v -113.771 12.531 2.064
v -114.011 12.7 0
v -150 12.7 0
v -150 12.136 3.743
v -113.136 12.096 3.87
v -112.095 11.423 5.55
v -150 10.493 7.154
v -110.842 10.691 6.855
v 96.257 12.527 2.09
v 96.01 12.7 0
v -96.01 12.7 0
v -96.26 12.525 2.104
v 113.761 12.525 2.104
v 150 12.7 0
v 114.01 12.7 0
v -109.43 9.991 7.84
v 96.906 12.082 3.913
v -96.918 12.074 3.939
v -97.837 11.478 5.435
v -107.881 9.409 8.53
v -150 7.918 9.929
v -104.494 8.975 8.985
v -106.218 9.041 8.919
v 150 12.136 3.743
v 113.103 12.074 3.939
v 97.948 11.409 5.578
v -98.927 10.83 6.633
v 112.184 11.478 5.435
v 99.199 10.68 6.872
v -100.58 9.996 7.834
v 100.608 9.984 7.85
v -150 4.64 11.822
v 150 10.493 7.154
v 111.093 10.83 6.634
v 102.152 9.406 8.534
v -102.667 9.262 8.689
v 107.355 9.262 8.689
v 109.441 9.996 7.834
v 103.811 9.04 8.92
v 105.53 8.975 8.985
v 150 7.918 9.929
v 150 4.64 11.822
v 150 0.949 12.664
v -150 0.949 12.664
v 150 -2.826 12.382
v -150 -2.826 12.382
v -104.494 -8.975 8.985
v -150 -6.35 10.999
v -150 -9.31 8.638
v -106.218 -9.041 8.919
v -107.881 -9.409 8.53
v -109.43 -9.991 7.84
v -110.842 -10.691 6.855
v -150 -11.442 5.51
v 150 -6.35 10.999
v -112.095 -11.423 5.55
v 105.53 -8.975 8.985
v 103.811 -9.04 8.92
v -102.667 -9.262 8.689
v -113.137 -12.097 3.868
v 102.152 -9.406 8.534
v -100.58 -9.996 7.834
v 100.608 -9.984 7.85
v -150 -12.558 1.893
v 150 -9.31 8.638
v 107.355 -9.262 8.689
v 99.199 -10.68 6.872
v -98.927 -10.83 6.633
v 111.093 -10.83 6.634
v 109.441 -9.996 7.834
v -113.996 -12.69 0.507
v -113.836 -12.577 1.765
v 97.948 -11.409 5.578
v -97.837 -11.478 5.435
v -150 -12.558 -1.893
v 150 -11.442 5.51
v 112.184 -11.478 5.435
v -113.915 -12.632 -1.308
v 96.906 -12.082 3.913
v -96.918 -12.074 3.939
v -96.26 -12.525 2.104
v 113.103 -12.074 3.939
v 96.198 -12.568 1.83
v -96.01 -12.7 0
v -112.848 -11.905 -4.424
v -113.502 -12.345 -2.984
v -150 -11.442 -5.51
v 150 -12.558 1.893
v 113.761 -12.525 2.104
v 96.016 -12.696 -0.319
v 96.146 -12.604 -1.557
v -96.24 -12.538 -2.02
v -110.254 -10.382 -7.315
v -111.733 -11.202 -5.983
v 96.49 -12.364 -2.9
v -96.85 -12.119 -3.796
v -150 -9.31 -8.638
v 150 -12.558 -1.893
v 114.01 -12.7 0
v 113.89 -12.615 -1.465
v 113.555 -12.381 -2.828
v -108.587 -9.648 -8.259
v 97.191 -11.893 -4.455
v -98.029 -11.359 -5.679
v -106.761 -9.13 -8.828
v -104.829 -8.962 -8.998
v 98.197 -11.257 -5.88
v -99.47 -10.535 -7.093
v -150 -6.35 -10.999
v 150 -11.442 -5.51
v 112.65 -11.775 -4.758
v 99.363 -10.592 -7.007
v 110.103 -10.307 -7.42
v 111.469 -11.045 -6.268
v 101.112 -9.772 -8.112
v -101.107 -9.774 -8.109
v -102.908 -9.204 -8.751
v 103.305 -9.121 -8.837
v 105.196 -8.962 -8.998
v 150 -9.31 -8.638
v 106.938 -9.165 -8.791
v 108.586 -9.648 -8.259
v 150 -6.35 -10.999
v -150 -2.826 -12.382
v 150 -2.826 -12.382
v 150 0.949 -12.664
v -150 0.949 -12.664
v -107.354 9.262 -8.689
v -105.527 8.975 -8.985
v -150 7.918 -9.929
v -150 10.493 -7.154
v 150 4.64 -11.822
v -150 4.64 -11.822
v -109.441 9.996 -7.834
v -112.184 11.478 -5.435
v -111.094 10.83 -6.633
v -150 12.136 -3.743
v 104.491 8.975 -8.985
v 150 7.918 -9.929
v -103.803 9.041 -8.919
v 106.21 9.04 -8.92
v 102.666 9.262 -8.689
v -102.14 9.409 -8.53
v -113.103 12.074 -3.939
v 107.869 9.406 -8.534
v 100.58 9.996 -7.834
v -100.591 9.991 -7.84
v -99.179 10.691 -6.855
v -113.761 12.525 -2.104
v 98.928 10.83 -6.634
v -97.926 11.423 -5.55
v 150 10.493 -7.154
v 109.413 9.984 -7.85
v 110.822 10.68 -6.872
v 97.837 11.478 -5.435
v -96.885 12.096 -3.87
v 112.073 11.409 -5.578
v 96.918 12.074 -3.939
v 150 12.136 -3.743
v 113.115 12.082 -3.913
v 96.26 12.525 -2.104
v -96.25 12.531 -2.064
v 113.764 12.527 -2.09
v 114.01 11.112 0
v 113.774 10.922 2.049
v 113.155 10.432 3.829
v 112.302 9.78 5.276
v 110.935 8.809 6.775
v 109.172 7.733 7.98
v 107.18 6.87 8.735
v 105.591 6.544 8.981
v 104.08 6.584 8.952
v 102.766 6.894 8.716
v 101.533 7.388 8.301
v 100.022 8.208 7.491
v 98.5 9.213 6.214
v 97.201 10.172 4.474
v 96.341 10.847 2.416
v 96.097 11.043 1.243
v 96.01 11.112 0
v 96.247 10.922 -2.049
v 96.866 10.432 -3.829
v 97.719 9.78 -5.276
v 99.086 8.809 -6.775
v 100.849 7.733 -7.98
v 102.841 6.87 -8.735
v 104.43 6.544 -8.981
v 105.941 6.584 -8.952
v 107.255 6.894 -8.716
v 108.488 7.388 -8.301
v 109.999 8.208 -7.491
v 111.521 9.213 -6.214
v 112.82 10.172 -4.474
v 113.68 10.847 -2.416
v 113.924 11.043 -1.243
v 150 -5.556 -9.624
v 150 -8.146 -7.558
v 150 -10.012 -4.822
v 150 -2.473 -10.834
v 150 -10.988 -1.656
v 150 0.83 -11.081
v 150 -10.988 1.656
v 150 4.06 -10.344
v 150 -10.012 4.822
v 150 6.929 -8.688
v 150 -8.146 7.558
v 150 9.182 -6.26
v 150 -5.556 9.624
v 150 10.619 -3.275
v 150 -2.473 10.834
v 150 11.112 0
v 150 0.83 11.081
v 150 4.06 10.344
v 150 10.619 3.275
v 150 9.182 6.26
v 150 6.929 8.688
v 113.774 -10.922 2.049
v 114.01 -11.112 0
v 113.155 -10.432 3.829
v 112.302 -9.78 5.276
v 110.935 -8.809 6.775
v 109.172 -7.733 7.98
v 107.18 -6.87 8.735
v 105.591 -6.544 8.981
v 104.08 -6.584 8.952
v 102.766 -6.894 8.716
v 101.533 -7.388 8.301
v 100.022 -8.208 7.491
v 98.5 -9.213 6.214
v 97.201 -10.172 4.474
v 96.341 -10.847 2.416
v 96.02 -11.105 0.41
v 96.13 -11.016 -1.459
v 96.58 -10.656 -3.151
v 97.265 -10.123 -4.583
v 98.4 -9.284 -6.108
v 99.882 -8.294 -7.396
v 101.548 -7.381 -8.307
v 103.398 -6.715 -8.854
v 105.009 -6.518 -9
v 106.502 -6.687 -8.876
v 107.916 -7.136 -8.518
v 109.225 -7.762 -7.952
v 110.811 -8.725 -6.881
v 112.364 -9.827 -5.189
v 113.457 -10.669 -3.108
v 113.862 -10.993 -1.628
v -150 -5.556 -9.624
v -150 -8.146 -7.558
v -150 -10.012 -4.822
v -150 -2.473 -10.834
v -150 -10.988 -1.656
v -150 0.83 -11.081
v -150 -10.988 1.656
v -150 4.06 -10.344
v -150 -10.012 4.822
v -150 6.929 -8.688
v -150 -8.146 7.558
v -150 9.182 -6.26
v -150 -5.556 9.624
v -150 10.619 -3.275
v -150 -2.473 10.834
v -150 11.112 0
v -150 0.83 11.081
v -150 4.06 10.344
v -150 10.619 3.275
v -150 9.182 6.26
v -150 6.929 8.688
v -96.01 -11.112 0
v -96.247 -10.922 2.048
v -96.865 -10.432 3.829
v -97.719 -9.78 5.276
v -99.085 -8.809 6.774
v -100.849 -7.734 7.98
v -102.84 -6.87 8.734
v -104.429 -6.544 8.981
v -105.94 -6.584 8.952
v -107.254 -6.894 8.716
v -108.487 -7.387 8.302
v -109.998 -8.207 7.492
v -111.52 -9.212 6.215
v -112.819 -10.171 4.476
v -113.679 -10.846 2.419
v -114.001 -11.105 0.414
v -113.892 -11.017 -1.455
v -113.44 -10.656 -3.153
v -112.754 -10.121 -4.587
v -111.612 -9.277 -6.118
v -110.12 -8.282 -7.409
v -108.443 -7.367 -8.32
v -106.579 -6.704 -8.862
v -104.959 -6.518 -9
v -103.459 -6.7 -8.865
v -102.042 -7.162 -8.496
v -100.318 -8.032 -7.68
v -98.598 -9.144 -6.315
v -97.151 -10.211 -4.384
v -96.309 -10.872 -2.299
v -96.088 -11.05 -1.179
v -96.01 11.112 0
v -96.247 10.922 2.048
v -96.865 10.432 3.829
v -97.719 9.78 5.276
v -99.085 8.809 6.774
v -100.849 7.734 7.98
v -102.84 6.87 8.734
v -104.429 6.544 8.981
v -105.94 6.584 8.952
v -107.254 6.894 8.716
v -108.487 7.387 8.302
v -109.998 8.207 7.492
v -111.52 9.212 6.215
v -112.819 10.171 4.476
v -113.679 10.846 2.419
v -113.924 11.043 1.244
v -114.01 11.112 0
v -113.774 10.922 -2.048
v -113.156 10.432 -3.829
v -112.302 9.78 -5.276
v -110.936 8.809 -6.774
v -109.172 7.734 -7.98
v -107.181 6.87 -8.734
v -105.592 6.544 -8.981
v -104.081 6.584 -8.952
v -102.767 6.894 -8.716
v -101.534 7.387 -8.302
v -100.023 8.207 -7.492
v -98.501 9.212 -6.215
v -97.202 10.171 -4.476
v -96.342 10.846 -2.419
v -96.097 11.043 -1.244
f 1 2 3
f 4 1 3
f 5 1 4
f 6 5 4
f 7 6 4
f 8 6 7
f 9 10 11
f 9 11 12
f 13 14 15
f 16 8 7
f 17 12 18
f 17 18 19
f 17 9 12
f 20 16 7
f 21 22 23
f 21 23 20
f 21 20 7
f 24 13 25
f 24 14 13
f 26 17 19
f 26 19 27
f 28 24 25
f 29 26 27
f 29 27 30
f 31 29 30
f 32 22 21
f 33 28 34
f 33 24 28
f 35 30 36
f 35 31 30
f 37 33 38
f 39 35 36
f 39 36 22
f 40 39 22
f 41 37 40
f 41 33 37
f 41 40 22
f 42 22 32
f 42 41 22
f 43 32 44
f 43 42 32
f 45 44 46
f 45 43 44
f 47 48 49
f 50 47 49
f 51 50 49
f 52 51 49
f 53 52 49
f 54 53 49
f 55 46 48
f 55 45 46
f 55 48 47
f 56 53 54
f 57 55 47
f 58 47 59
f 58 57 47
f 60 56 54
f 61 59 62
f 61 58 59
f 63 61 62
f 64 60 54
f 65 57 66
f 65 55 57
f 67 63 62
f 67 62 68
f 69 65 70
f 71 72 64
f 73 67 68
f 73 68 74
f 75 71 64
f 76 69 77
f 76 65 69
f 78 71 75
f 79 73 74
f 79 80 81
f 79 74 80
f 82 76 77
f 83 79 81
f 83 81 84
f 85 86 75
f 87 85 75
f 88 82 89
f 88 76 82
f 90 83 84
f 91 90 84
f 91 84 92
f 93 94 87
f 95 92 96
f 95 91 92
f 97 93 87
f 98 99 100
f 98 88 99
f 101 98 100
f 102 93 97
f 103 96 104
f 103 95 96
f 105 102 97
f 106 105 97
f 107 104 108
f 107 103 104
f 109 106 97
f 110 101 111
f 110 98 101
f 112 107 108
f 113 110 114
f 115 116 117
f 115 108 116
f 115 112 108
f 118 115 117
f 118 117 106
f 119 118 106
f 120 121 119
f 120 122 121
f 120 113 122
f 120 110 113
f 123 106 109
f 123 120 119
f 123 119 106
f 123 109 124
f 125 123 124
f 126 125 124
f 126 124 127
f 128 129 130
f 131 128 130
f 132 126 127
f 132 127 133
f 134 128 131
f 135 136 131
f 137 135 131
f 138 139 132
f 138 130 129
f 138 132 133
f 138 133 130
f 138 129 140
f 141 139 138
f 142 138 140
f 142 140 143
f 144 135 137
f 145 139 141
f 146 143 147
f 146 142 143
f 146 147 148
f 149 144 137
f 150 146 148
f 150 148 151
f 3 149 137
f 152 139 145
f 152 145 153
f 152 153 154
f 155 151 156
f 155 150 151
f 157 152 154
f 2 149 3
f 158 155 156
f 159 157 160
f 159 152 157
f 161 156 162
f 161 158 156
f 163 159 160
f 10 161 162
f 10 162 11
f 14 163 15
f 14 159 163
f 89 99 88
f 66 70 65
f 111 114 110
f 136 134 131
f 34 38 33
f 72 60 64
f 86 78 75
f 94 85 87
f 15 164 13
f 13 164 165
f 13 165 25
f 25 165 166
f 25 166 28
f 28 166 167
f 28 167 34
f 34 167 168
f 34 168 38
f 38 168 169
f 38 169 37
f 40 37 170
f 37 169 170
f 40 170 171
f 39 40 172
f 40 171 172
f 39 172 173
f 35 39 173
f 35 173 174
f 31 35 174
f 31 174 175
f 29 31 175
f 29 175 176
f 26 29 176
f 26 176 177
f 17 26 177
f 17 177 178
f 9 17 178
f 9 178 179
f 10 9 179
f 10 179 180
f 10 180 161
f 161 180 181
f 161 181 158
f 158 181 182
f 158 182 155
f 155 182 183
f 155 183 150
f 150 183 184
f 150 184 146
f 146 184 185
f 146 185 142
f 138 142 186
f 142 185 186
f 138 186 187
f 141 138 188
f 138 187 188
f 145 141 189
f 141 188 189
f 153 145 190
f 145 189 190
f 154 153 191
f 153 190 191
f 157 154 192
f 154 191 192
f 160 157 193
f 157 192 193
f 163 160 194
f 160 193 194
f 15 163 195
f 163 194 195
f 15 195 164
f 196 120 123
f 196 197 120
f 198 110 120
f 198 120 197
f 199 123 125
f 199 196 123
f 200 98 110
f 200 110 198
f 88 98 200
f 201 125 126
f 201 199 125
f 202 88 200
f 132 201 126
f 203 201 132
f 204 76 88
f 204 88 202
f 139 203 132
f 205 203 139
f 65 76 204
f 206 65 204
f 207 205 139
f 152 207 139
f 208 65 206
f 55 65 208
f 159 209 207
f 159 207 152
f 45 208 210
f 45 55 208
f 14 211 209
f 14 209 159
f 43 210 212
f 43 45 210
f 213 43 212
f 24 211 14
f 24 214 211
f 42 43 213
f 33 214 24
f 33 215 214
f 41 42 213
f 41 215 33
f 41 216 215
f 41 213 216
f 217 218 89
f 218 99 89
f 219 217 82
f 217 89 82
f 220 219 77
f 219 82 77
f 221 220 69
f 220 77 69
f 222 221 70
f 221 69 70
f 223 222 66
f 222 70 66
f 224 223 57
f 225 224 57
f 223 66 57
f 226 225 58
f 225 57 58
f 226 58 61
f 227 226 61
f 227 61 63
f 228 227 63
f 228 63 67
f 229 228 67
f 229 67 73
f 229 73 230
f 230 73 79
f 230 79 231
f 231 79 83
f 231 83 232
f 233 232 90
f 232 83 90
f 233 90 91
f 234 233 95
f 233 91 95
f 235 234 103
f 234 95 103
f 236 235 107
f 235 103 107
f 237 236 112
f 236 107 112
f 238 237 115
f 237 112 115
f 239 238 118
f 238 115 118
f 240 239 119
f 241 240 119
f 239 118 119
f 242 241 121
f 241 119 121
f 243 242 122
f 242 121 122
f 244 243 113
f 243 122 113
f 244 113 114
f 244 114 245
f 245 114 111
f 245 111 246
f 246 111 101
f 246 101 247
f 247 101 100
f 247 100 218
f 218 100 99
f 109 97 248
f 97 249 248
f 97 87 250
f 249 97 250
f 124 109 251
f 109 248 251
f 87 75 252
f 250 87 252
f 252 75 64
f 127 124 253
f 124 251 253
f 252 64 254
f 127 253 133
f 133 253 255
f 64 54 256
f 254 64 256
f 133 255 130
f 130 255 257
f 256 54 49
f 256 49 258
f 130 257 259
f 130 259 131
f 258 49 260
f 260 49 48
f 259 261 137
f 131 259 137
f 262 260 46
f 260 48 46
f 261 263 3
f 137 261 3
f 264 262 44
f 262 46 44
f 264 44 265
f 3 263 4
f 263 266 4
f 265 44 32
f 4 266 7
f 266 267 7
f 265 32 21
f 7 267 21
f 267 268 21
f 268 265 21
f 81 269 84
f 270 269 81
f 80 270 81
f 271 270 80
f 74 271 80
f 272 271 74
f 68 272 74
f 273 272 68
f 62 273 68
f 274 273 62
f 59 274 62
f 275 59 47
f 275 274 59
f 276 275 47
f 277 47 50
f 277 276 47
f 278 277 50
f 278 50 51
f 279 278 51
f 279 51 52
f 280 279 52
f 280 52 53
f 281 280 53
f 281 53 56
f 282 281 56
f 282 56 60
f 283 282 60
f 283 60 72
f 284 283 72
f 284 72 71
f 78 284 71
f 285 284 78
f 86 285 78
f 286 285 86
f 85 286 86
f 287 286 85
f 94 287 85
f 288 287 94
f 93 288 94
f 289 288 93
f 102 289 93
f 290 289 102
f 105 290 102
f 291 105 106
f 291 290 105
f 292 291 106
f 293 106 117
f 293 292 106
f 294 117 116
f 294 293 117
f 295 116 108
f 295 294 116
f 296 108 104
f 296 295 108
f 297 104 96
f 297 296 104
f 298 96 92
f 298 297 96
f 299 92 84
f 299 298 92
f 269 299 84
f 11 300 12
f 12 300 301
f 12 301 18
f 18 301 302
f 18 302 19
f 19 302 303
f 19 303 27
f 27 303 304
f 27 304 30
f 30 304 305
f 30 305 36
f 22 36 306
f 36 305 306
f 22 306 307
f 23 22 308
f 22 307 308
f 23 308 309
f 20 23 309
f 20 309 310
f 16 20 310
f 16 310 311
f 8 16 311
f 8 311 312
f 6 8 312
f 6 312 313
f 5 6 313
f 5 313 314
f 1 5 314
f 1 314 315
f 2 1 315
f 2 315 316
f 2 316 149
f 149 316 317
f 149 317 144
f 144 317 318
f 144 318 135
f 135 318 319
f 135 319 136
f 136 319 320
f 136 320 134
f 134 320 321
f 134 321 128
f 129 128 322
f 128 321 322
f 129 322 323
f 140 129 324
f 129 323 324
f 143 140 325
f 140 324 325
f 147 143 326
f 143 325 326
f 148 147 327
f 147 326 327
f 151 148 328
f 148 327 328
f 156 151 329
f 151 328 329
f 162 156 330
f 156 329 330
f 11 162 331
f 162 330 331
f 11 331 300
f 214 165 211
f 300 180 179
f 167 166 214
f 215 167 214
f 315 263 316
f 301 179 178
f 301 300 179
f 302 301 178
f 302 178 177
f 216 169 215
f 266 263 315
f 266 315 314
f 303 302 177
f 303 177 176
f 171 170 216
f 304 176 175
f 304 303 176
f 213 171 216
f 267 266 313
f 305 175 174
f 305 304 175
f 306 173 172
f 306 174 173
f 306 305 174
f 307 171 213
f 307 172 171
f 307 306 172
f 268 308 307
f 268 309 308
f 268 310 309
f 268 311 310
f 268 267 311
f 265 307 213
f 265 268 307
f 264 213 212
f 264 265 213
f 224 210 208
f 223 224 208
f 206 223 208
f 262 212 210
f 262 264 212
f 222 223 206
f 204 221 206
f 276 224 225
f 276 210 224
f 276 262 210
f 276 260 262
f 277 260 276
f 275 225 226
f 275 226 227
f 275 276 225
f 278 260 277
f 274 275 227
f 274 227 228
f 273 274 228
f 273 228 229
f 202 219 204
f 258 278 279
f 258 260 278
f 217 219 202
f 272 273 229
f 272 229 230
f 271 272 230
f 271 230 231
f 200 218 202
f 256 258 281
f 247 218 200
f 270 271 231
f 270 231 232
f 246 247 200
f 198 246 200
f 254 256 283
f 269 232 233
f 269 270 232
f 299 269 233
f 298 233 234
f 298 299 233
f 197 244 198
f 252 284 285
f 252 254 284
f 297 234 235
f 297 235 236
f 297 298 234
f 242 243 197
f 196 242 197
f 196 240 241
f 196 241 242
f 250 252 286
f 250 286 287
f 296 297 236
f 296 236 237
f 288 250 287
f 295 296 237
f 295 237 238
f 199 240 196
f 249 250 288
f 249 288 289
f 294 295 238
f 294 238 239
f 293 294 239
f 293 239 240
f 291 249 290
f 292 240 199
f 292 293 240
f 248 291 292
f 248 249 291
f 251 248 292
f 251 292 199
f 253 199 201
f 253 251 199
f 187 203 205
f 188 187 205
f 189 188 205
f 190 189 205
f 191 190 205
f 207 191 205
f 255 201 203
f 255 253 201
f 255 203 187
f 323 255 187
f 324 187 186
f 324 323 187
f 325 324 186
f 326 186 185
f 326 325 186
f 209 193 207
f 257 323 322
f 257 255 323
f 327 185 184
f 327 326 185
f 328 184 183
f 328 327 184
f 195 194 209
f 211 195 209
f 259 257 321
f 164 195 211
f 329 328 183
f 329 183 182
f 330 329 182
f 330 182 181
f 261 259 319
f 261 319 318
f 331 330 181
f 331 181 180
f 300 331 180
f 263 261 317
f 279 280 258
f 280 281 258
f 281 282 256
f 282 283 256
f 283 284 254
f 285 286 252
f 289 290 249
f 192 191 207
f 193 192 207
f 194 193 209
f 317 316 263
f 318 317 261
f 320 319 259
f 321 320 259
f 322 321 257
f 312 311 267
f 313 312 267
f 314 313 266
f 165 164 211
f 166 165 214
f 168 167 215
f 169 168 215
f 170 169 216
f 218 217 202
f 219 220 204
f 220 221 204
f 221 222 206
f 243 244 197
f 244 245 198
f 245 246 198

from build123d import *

# Parameters (mm, degrees)
F0_R     = 12.7
F0_R_2   = 11.1125
F1_DEPTH = 150
F2_R     = 9
F3_DEPTH = 15


with BuildPart() as f1:
    # F0 (on Right) → F1 (new body, symmetric)
    with BuildSketch(Plane.YZ):
        Circle(F0_R)
        Circle(F0_R_2, mode=Mode.SUBTRACT)
    extrude(amount=F1_DEPTH, both=True)

    # F2 (on Front) → F3 (cut, symmetric)
    with BuildSketch(Plane.XZ):
        with Locations((-105.0105, 0)):
            Circle(F2_R)
        with Locations((105.0105, 0)):
            Circle(F2_R)
    extrude(amount=F3_DEPTH, both=True, mode=Mode.SUBTRACT)


solid = f1.part
